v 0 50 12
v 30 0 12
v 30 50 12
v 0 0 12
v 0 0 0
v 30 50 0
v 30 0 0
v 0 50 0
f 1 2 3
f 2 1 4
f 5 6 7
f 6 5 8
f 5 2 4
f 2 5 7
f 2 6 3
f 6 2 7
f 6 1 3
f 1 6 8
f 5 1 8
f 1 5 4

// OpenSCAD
// smoke stand-in for the generated case SCAD of record (its md5 keys the guide renders)
cube([30, 50, 12]);
